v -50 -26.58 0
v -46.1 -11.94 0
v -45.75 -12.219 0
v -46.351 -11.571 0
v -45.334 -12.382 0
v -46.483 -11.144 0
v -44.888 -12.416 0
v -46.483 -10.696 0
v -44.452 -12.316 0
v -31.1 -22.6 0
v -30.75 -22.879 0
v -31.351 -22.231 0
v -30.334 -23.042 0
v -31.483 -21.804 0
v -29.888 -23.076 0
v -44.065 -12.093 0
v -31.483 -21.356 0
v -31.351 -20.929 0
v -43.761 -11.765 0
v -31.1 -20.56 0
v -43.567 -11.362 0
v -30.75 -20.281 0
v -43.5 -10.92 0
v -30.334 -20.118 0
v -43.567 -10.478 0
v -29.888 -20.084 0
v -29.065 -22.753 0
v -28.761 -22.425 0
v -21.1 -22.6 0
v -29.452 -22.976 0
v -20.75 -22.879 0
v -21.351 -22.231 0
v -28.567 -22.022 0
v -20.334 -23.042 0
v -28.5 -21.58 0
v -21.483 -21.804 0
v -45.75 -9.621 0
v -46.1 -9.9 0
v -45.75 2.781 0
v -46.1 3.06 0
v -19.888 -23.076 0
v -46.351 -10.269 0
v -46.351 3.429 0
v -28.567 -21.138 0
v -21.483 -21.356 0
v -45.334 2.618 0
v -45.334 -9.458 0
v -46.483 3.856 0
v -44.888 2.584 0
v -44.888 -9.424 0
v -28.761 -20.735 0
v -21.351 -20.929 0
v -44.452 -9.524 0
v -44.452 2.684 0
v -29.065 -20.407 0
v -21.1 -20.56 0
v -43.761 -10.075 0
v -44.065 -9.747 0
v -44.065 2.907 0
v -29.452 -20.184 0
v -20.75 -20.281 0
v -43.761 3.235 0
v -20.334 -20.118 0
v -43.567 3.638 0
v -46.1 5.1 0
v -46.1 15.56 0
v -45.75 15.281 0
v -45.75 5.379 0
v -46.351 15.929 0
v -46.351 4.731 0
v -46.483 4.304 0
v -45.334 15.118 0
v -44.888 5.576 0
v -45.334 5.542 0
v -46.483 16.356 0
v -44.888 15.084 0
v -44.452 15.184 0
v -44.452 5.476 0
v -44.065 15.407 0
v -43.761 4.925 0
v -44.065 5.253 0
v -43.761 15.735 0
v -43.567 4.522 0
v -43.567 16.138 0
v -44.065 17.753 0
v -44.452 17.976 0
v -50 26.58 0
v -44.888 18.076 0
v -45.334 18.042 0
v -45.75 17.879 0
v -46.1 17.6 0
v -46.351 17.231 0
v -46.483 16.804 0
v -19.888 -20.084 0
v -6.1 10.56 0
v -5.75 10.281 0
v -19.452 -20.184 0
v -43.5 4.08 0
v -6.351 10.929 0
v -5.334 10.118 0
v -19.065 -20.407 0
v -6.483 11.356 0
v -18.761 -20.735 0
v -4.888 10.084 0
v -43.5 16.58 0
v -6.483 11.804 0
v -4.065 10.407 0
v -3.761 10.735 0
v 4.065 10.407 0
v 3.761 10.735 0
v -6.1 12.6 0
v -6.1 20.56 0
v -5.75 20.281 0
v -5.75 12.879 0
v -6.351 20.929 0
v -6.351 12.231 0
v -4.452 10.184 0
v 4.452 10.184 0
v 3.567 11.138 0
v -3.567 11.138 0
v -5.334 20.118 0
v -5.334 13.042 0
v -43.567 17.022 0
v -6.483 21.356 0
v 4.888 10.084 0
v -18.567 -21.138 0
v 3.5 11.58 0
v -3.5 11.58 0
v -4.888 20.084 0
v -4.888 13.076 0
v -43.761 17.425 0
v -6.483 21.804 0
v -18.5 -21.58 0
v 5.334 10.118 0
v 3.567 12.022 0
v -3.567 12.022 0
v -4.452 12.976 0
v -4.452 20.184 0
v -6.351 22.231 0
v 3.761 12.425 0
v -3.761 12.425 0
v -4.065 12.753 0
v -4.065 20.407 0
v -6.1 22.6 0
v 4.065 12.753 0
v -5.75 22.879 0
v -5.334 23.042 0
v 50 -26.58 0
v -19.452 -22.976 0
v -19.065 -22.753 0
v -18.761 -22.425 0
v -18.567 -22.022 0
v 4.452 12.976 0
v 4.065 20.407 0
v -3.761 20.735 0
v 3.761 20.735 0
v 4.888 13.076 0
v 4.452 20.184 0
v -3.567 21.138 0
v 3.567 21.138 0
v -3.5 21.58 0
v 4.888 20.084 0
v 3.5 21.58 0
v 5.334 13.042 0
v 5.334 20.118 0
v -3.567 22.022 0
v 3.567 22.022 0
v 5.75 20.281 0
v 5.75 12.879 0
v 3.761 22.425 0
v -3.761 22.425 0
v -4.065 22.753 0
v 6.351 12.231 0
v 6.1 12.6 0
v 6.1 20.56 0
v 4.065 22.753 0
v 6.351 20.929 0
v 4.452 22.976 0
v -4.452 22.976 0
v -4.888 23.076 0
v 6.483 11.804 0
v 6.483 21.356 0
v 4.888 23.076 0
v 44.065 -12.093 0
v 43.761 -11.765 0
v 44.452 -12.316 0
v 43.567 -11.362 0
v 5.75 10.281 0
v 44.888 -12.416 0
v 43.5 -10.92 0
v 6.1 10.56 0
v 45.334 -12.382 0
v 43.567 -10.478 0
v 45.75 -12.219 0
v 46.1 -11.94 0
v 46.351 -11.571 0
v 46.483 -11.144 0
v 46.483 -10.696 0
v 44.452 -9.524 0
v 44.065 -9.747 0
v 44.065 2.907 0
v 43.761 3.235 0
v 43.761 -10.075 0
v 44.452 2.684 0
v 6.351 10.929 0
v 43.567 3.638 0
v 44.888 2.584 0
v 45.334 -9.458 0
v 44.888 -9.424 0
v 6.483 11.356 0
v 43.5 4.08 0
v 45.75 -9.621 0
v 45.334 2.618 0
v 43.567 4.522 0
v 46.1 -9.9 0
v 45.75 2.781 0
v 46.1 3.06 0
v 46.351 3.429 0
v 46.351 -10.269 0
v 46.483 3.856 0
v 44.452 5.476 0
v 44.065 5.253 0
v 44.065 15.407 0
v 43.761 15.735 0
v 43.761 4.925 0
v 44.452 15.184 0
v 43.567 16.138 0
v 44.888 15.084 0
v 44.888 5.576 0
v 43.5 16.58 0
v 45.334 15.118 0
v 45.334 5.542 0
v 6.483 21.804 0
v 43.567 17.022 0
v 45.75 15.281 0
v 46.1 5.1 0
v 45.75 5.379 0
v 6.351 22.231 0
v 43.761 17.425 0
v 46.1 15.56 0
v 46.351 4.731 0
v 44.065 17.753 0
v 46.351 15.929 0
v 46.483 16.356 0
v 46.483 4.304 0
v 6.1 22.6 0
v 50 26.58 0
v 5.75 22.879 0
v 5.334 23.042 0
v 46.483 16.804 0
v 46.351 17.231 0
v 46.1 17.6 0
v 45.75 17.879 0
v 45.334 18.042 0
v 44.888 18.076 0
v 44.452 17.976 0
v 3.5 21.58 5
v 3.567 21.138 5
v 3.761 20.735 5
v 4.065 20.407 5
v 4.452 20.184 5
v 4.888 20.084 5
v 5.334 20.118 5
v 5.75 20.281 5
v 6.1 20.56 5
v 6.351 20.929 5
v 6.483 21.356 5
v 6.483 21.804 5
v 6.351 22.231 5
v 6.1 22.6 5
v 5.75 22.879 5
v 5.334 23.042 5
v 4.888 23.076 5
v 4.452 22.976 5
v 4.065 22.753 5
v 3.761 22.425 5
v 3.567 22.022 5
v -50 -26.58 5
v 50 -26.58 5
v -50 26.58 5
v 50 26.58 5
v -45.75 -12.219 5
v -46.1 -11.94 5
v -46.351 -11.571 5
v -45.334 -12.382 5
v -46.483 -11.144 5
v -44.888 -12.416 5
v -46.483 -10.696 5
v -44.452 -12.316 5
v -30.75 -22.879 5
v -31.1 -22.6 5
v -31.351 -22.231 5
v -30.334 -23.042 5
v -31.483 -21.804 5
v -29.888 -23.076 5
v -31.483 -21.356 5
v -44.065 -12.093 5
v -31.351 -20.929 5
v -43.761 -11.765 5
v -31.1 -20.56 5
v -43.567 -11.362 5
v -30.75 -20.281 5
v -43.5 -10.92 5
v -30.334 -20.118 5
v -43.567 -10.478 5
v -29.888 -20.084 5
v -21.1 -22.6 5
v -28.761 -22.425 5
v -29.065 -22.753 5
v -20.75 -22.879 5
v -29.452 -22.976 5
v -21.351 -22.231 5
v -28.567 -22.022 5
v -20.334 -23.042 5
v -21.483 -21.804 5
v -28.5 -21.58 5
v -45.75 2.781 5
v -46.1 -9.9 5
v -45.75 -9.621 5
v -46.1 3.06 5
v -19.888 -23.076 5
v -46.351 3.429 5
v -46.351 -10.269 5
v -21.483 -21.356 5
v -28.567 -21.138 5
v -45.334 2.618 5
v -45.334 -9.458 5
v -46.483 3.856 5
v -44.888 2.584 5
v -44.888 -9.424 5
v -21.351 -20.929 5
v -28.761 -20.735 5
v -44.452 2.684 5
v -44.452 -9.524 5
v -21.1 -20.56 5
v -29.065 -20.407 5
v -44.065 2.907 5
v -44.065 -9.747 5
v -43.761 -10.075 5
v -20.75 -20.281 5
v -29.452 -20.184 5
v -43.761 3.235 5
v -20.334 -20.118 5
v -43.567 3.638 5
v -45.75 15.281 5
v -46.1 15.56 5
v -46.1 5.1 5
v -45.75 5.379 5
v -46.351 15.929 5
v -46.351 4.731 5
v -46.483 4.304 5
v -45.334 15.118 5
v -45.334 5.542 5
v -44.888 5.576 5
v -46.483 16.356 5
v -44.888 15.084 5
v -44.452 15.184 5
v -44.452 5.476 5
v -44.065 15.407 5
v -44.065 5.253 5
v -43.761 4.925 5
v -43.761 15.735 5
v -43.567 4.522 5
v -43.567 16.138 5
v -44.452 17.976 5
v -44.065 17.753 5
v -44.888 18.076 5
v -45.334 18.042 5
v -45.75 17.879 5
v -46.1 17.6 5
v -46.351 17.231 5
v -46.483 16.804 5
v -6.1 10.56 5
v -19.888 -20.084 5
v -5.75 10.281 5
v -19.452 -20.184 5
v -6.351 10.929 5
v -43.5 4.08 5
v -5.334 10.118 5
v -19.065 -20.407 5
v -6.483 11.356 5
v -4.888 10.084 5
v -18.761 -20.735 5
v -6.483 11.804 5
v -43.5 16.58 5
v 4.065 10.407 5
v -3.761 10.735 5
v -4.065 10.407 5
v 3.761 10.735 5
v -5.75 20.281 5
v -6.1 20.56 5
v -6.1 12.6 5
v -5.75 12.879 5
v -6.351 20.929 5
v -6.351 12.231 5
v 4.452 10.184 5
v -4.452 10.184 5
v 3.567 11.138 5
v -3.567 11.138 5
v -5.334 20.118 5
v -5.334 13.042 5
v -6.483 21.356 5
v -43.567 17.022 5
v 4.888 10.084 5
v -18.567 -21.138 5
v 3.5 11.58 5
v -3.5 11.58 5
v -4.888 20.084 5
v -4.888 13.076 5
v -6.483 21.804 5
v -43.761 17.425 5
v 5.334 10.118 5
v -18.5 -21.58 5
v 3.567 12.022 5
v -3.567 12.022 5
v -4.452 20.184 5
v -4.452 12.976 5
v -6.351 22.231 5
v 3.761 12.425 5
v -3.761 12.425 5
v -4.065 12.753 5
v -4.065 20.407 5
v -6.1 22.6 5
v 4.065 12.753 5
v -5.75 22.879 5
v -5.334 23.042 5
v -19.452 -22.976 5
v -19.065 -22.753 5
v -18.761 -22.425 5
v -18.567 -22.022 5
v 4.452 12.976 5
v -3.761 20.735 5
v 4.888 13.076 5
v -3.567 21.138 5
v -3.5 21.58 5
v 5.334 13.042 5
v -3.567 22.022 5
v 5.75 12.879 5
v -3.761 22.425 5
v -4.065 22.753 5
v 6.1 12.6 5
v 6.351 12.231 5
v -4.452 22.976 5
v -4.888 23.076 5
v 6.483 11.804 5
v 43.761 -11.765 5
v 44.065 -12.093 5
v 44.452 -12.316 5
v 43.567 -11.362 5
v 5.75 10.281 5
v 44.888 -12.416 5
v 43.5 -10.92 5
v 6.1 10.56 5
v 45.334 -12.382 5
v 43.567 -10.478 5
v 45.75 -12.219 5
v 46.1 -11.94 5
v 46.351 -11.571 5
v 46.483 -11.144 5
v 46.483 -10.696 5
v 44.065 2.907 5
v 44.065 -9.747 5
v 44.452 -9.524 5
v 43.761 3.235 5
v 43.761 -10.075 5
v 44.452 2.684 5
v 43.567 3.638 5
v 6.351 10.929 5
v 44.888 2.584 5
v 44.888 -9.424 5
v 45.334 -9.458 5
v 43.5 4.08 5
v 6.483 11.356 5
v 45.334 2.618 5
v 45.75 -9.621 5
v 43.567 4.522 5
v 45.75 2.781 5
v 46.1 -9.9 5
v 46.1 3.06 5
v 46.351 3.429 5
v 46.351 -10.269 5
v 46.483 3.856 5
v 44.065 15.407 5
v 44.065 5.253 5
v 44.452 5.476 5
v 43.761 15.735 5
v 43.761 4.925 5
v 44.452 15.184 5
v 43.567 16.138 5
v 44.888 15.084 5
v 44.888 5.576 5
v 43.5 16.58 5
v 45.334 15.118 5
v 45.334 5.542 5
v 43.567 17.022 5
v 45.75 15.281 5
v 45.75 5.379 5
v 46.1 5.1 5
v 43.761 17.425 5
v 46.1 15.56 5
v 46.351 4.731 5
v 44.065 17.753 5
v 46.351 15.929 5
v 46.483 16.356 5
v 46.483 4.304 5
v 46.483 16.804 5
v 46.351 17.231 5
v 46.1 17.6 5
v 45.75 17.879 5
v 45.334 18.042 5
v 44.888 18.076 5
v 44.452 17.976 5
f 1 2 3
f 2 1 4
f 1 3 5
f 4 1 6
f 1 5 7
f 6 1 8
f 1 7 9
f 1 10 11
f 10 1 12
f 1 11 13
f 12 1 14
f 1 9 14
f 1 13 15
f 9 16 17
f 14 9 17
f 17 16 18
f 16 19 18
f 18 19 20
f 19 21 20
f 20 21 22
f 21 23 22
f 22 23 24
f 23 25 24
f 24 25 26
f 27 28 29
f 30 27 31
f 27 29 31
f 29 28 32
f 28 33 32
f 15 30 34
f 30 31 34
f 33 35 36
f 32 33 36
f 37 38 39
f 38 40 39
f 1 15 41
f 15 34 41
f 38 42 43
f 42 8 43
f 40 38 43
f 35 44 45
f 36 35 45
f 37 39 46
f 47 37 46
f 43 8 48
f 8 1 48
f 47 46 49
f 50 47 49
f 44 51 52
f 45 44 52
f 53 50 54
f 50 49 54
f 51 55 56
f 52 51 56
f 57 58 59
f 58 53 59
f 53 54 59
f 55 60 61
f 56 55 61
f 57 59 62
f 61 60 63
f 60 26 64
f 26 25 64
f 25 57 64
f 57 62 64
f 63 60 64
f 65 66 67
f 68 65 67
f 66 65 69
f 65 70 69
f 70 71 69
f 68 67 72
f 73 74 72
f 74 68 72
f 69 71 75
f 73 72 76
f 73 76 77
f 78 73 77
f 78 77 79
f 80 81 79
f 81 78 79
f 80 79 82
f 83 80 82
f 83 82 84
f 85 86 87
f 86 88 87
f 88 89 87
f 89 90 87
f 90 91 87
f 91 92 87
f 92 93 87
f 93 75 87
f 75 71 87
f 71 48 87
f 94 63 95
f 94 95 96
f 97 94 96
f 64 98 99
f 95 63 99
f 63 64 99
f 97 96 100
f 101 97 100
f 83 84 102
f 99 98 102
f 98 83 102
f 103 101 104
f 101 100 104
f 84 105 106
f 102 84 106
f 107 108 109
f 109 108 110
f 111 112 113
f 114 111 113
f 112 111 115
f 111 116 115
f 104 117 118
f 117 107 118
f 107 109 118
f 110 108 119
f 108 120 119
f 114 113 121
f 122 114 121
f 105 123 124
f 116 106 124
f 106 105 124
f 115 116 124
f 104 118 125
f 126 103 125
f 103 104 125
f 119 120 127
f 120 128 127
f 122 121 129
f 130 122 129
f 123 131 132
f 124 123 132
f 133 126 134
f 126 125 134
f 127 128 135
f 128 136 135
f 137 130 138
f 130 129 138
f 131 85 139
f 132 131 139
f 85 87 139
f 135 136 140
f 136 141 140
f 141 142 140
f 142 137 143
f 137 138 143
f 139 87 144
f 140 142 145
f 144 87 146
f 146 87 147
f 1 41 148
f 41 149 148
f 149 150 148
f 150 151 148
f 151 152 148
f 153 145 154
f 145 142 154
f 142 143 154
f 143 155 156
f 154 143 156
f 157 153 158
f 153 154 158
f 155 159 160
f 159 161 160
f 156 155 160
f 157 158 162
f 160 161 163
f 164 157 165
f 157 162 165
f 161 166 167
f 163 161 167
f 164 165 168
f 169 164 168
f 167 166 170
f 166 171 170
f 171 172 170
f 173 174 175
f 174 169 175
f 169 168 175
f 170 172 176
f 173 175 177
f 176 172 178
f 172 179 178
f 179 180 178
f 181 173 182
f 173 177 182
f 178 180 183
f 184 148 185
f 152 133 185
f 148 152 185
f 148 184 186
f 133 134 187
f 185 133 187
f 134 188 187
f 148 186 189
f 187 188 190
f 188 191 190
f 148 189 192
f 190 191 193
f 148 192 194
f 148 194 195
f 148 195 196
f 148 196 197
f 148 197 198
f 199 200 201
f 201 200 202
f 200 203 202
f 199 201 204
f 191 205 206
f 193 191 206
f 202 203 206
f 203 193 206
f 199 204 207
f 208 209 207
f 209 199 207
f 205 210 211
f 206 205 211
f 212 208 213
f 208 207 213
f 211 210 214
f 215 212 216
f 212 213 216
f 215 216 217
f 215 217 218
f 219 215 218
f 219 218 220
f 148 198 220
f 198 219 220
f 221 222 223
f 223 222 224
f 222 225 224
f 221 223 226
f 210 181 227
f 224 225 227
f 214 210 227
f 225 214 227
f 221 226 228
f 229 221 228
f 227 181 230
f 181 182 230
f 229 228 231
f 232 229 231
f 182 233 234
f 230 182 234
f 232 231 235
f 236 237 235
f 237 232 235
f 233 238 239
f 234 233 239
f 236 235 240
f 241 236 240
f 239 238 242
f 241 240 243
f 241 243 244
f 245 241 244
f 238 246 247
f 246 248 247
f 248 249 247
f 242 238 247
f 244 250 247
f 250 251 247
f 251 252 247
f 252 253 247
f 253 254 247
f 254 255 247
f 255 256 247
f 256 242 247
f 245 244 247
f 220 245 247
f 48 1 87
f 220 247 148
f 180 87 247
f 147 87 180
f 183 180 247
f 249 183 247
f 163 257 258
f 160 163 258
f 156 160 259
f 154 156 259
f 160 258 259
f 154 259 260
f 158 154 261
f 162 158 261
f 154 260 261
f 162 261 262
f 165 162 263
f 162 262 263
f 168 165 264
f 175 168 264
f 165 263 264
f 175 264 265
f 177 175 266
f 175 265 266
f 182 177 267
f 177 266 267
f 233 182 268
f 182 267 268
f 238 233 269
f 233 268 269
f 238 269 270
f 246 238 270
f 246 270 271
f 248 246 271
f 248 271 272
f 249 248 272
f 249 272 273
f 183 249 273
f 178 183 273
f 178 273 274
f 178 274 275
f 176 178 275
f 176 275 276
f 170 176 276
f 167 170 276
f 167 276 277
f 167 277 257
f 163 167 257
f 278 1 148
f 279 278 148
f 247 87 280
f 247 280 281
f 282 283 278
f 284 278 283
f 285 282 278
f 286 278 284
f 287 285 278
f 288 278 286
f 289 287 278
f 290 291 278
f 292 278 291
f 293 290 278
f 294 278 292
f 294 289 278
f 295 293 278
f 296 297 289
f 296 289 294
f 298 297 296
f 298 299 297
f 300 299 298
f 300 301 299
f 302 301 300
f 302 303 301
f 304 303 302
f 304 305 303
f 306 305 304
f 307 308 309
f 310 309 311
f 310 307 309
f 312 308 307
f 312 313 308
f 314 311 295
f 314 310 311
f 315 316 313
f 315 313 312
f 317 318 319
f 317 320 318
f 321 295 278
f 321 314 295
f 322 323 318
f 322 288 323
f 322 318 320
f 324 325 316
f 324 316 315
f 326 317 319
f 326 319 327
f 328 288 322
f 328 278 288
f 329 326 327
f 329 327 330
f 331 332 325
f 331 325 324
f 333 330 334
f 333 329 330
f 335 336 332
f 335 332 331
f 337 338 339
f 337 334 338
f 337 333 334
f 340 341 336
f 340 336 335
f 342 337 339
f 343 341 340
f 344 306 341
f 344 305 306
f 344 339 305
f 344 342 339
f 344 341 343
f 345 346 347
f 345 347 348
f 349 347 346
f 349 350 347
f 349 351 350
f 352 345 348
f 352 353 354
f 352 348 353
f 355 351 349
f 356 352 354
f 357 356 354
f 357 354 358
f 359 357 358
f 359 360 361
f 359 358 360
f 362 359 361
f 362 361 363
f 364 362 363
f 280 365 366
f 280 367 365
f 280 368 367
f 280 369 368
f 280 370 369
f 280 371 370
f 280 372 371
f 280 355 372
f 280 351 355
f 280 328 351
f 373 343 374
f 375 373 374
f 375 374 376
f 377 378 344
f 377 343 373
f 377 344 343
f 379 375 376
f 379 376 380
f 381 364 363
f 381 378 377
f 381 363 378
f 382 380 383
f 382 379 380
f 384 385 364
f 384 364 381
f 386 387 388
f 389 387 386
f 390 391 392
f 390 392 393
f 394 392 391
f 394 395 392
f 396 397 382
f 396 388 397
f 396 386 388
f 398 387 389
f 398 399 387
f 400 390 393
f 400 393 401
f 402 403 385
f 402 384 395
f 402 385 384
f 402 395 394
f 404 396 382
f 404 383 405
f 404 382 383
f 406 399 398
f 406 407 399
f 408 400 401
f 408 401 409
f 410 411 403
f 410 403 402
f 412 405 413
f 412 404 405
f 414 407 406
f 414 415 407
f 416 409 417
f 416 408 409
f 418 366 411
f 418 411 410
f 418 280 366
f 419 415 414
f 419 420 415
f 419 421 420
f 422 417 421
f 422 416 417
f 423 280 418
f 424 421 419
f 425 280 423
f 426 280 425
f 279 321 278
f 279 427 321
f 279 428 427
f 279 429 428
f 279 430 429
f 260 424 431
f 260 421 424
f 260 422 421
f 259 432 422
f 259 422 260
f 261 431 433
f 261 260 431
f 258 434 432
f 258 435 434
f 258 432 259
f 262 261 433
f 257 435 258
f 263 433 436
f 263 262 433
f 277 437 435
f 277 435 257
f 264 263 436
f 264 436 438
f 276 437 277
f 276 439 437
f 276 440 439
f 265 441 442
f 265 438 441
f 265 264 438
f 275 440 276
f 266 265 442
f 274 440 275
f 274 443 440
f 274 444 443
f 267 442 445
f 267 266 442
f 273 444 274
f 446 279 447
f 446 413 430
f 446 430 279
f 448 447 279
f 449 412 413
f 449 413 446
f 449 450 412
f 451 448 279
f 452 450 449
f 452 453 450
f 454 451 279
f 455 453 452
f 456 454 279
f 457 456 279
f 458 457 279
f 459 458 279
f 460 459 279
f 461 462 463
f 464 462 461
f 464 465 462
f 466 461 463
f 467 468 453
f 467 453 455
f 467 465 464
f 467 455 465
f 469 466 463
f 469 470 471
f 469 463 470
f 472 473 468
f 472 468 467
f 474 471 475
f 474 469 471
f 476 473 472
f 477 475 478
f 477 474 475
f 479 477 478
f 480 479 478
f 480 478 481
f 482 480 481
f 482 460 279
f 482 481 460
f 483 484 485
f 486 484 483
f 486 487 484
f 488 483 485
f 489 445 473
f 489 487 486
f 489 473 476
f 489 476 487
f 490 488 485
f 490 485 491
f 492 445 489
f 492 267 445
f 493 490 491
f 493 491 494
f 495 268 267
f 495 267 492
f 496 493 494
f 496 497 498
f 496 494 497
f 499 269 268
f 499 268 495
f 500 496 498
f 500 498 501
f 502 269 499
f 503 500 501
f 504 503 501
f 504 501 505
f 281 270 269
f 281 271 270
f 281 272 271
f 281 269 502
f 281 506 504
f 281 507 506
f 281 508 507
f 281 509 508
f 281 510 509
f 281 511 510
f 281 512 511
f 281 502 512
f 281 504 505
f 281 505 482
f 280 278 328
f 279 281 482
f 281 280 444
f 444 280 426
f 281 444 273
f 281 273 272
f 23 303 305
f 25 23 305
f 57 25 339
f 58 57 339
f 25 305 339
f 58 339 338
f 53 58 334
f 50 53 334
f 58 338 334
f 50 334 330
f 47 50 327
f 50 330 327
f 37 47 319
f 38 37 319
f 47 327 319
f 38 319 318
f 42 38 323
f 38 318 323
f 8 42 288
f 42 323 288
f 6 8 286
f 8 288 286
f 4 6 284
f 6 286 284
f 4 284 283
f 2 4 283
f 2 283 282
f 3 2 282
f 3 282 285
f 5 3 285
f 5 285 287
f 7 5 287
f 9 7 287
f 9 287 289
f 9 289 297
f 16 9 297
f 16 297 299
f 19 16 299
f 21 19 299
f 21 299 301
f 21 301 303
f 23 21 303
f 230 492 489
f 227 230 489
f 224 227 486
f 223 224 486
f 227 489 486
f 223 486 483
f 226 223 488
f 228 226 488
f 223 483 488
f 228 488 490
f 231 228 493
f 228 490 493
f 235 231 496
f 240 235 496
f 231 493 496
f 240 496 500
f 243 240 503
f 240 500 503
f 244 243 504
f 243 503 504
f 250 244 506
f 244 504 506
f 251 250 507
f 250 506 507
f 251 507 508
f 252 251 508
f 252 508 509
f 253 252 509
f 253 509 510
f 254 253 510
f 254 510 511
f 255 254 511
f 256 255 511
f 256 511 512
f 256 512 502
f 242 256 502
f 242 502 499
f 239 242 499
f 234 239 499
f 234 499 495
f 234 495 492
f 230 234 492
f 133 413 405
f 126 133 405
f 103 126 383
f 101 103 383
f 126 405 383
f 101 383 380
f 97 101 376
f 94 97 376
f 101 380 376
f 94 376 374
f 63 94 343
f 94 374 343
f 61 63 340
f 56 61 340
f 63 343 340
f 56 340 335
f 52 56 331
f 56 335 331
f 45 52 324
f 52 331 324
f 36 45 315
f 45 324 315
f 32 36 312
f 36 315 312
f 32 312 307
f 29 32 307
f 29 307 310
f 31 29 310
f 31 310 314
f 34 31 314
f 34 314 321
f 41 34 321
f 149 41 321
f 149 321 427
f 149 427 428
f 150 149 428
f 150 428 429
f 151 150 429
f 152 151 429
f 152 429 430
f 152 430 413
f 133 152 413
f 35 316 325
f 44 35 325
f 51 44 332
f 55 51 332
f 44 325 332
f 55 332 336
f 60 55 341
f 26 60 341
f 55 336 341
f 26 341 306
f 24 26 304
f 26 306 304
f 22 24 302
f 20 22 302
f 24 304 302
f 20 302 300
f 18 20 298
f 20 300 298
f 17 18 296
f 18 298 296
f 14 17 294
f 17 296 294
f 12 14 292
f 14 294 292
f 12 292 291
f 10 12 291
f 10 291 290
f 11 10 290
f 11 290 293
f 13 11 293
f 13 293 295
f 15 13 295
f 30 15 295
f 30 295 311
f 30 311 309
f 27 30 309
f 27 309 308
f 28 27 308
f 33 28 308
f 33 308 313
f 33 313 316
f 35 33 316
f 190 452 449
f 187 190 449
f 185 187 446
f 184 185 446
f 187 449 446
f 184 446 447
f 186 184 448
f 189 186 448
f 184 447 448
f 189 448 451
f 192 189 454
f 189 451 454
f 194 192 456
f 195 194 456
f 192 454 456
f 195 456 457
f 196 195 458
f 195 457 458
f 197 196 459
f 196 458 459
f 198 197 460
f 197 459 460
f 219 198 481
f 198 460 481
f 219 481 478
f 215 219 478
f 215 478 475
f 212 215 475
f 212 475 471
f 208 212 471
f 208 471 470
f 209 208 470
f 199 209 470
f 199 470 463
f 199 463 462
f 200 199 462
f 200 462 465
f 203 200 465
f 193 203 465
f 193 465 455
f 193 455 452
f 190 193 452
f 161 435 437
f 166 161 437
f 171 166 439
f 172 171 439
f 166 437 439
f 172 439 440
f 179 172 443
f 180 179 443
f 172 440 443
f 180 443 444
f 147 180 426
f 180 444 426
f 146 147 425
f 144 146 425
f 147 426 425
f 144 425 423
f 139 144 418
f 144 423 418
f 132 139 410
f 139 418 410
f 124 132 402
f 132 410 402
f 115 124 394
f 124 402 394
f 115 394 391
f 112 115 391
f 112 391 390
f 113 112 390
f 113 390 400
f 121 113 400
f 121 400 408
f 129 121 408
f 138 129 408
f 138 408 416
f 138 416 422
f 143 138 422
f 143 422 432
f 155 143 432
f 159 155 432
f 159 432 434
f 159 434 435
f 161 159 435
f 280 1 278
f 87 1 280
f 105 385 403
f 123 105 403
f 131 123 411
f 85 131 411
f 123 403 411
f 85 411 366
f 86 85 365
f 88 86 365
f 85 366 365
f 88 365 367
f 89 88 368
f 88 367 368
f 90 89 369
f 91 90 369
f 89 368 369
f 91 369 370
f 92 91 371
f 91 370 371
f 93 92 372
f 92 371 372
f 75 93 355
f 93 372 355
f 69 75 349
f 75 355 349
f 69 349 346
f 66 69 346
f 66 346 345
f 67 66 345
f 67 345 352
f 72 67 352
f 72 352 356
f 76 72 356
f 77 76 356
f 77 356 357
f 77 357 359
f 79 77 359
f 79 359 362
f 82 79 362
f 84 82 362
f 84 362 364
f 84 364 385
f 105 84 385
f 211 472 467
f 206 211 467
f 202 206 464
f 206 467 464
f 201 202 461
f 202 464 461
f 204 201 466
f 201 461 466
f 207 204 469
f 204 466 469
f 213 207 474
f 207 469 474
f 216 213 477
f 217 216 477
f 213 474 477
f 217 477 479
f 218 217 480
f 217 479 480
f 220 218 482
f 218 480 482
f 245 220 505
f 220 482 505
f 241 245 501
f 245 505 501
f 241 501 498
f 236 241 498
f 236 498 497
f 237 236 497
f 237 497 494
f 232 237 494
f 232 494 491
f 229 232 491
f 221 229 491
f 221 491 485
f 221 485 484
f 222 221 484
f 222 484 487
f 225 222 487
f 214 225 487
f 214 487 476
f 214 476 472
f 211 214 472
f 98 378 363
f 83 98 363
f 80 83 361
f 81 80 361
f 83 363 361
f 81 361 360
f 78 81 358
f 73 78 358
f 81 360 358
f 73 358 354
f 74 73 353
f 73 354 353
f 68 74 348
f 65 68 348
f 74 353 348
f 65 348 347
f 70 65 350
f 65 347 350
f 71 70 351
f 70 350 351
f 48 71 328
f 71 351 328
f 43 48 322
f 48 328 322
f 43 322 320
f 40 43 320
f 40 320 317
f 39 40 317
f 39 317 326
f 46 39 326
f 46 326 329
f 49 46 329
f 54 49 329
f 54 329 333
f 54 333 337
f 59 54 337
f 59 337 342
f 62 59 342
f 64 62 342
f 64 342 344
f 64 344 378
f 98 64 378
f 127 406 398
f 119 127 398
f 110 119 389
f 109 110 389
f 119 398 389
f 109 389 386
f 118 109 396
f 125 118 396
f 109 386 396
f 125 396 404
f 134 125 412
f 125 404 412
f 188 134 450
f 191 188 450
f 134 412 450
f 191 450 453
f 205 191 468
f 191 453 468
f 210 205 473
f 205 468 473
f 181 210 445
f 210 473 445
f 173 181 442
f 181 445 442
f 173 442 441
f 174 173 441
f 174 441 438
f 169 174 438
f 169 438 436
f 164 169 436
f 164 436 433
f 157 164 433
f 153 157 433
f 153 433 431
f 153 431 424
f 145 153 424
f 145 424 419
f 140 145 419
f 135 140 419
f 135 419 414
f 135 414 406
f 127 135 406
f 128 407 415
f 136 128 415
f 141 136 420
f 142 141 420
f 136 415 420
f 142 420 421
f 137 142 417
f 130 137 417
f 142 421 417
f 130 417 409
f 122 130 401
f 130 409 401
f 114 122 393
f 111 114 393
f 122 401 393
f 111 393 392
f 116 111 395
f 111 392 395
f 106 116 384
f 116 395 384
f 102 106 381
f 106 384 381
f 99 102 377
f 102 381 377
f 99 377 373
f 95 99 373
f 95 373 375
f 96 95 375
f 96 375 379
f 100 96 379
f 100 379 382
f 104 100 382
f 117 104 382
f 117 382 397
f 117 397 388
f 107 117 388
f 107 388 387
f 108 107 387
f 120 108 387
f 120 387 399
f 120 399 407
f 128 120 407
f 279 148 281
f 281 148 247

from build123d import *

# Parameters (mm, degrees)
SKETCH1_W           = 100
SKETCH1_H           = 53.16
BOSS_EXTRUDE1_DEPTH = 5
SKETCH2_R           = 1.5
CUT_EXTRUDE1_DEPTH  = 57.846252295


with BuildPart() as part:
    # Sketch1 → Boss-Extrude1 (new body)
    with BuildSketch(Plane.XY):
        Rectangle(SKETCH1_W, SKETCH1_H)
    extrude(amount=BOSS_EXTRUDE1_DEPTH)

    # Sketch2 → Cut-Extrude1 (cut, through all)
    with BuildSketch(Plane.XY.offset(5)):
        with Locations((-45, 16.58)):
            Circle(SKETCH2_R)
        with Locations((-45, 4.08)):
            Circle(SKETCH2_R)
        with Locations((-45, -10.92)):
            Circle(SKETCH2_R)
        with Locations(Location((45, -10.92, 0), (0, 0, 180))):
            Circle(SKETCH2_R)
        with Locations(Location((45, 4.08, 0), (0, 0, 180))):
            Circle(SKETCH2_R)
        with Locations(Location((45, 16.58, 0), (0, 0, 180))):
            Circle(SKETCH2_R)
        with Locations((-5, 11.58)):
            Circle(SKETCH2_R)
        with Locations((-5, 21.58)):
            Circle(SKETCH2_R)
        with Locations(Location((5, 11.58, 0), (0, 0, 180))):
            Circle(SKETCH2_R)
        with Locations(Location((5, 21.58, 0), (0, 0, 180))):
            Circle(SKETCH2_R)
        with Locations((-30, -21.58)):
            Circle(SKETCH2_R)
        with Locations((-20, -21.58)):
            Circle(SKETCH2_R)
    extrude(amount=-CUT_EXTRUDE1_DEPTH, mode=Mode.SUBTRACT)


solid = part.part
